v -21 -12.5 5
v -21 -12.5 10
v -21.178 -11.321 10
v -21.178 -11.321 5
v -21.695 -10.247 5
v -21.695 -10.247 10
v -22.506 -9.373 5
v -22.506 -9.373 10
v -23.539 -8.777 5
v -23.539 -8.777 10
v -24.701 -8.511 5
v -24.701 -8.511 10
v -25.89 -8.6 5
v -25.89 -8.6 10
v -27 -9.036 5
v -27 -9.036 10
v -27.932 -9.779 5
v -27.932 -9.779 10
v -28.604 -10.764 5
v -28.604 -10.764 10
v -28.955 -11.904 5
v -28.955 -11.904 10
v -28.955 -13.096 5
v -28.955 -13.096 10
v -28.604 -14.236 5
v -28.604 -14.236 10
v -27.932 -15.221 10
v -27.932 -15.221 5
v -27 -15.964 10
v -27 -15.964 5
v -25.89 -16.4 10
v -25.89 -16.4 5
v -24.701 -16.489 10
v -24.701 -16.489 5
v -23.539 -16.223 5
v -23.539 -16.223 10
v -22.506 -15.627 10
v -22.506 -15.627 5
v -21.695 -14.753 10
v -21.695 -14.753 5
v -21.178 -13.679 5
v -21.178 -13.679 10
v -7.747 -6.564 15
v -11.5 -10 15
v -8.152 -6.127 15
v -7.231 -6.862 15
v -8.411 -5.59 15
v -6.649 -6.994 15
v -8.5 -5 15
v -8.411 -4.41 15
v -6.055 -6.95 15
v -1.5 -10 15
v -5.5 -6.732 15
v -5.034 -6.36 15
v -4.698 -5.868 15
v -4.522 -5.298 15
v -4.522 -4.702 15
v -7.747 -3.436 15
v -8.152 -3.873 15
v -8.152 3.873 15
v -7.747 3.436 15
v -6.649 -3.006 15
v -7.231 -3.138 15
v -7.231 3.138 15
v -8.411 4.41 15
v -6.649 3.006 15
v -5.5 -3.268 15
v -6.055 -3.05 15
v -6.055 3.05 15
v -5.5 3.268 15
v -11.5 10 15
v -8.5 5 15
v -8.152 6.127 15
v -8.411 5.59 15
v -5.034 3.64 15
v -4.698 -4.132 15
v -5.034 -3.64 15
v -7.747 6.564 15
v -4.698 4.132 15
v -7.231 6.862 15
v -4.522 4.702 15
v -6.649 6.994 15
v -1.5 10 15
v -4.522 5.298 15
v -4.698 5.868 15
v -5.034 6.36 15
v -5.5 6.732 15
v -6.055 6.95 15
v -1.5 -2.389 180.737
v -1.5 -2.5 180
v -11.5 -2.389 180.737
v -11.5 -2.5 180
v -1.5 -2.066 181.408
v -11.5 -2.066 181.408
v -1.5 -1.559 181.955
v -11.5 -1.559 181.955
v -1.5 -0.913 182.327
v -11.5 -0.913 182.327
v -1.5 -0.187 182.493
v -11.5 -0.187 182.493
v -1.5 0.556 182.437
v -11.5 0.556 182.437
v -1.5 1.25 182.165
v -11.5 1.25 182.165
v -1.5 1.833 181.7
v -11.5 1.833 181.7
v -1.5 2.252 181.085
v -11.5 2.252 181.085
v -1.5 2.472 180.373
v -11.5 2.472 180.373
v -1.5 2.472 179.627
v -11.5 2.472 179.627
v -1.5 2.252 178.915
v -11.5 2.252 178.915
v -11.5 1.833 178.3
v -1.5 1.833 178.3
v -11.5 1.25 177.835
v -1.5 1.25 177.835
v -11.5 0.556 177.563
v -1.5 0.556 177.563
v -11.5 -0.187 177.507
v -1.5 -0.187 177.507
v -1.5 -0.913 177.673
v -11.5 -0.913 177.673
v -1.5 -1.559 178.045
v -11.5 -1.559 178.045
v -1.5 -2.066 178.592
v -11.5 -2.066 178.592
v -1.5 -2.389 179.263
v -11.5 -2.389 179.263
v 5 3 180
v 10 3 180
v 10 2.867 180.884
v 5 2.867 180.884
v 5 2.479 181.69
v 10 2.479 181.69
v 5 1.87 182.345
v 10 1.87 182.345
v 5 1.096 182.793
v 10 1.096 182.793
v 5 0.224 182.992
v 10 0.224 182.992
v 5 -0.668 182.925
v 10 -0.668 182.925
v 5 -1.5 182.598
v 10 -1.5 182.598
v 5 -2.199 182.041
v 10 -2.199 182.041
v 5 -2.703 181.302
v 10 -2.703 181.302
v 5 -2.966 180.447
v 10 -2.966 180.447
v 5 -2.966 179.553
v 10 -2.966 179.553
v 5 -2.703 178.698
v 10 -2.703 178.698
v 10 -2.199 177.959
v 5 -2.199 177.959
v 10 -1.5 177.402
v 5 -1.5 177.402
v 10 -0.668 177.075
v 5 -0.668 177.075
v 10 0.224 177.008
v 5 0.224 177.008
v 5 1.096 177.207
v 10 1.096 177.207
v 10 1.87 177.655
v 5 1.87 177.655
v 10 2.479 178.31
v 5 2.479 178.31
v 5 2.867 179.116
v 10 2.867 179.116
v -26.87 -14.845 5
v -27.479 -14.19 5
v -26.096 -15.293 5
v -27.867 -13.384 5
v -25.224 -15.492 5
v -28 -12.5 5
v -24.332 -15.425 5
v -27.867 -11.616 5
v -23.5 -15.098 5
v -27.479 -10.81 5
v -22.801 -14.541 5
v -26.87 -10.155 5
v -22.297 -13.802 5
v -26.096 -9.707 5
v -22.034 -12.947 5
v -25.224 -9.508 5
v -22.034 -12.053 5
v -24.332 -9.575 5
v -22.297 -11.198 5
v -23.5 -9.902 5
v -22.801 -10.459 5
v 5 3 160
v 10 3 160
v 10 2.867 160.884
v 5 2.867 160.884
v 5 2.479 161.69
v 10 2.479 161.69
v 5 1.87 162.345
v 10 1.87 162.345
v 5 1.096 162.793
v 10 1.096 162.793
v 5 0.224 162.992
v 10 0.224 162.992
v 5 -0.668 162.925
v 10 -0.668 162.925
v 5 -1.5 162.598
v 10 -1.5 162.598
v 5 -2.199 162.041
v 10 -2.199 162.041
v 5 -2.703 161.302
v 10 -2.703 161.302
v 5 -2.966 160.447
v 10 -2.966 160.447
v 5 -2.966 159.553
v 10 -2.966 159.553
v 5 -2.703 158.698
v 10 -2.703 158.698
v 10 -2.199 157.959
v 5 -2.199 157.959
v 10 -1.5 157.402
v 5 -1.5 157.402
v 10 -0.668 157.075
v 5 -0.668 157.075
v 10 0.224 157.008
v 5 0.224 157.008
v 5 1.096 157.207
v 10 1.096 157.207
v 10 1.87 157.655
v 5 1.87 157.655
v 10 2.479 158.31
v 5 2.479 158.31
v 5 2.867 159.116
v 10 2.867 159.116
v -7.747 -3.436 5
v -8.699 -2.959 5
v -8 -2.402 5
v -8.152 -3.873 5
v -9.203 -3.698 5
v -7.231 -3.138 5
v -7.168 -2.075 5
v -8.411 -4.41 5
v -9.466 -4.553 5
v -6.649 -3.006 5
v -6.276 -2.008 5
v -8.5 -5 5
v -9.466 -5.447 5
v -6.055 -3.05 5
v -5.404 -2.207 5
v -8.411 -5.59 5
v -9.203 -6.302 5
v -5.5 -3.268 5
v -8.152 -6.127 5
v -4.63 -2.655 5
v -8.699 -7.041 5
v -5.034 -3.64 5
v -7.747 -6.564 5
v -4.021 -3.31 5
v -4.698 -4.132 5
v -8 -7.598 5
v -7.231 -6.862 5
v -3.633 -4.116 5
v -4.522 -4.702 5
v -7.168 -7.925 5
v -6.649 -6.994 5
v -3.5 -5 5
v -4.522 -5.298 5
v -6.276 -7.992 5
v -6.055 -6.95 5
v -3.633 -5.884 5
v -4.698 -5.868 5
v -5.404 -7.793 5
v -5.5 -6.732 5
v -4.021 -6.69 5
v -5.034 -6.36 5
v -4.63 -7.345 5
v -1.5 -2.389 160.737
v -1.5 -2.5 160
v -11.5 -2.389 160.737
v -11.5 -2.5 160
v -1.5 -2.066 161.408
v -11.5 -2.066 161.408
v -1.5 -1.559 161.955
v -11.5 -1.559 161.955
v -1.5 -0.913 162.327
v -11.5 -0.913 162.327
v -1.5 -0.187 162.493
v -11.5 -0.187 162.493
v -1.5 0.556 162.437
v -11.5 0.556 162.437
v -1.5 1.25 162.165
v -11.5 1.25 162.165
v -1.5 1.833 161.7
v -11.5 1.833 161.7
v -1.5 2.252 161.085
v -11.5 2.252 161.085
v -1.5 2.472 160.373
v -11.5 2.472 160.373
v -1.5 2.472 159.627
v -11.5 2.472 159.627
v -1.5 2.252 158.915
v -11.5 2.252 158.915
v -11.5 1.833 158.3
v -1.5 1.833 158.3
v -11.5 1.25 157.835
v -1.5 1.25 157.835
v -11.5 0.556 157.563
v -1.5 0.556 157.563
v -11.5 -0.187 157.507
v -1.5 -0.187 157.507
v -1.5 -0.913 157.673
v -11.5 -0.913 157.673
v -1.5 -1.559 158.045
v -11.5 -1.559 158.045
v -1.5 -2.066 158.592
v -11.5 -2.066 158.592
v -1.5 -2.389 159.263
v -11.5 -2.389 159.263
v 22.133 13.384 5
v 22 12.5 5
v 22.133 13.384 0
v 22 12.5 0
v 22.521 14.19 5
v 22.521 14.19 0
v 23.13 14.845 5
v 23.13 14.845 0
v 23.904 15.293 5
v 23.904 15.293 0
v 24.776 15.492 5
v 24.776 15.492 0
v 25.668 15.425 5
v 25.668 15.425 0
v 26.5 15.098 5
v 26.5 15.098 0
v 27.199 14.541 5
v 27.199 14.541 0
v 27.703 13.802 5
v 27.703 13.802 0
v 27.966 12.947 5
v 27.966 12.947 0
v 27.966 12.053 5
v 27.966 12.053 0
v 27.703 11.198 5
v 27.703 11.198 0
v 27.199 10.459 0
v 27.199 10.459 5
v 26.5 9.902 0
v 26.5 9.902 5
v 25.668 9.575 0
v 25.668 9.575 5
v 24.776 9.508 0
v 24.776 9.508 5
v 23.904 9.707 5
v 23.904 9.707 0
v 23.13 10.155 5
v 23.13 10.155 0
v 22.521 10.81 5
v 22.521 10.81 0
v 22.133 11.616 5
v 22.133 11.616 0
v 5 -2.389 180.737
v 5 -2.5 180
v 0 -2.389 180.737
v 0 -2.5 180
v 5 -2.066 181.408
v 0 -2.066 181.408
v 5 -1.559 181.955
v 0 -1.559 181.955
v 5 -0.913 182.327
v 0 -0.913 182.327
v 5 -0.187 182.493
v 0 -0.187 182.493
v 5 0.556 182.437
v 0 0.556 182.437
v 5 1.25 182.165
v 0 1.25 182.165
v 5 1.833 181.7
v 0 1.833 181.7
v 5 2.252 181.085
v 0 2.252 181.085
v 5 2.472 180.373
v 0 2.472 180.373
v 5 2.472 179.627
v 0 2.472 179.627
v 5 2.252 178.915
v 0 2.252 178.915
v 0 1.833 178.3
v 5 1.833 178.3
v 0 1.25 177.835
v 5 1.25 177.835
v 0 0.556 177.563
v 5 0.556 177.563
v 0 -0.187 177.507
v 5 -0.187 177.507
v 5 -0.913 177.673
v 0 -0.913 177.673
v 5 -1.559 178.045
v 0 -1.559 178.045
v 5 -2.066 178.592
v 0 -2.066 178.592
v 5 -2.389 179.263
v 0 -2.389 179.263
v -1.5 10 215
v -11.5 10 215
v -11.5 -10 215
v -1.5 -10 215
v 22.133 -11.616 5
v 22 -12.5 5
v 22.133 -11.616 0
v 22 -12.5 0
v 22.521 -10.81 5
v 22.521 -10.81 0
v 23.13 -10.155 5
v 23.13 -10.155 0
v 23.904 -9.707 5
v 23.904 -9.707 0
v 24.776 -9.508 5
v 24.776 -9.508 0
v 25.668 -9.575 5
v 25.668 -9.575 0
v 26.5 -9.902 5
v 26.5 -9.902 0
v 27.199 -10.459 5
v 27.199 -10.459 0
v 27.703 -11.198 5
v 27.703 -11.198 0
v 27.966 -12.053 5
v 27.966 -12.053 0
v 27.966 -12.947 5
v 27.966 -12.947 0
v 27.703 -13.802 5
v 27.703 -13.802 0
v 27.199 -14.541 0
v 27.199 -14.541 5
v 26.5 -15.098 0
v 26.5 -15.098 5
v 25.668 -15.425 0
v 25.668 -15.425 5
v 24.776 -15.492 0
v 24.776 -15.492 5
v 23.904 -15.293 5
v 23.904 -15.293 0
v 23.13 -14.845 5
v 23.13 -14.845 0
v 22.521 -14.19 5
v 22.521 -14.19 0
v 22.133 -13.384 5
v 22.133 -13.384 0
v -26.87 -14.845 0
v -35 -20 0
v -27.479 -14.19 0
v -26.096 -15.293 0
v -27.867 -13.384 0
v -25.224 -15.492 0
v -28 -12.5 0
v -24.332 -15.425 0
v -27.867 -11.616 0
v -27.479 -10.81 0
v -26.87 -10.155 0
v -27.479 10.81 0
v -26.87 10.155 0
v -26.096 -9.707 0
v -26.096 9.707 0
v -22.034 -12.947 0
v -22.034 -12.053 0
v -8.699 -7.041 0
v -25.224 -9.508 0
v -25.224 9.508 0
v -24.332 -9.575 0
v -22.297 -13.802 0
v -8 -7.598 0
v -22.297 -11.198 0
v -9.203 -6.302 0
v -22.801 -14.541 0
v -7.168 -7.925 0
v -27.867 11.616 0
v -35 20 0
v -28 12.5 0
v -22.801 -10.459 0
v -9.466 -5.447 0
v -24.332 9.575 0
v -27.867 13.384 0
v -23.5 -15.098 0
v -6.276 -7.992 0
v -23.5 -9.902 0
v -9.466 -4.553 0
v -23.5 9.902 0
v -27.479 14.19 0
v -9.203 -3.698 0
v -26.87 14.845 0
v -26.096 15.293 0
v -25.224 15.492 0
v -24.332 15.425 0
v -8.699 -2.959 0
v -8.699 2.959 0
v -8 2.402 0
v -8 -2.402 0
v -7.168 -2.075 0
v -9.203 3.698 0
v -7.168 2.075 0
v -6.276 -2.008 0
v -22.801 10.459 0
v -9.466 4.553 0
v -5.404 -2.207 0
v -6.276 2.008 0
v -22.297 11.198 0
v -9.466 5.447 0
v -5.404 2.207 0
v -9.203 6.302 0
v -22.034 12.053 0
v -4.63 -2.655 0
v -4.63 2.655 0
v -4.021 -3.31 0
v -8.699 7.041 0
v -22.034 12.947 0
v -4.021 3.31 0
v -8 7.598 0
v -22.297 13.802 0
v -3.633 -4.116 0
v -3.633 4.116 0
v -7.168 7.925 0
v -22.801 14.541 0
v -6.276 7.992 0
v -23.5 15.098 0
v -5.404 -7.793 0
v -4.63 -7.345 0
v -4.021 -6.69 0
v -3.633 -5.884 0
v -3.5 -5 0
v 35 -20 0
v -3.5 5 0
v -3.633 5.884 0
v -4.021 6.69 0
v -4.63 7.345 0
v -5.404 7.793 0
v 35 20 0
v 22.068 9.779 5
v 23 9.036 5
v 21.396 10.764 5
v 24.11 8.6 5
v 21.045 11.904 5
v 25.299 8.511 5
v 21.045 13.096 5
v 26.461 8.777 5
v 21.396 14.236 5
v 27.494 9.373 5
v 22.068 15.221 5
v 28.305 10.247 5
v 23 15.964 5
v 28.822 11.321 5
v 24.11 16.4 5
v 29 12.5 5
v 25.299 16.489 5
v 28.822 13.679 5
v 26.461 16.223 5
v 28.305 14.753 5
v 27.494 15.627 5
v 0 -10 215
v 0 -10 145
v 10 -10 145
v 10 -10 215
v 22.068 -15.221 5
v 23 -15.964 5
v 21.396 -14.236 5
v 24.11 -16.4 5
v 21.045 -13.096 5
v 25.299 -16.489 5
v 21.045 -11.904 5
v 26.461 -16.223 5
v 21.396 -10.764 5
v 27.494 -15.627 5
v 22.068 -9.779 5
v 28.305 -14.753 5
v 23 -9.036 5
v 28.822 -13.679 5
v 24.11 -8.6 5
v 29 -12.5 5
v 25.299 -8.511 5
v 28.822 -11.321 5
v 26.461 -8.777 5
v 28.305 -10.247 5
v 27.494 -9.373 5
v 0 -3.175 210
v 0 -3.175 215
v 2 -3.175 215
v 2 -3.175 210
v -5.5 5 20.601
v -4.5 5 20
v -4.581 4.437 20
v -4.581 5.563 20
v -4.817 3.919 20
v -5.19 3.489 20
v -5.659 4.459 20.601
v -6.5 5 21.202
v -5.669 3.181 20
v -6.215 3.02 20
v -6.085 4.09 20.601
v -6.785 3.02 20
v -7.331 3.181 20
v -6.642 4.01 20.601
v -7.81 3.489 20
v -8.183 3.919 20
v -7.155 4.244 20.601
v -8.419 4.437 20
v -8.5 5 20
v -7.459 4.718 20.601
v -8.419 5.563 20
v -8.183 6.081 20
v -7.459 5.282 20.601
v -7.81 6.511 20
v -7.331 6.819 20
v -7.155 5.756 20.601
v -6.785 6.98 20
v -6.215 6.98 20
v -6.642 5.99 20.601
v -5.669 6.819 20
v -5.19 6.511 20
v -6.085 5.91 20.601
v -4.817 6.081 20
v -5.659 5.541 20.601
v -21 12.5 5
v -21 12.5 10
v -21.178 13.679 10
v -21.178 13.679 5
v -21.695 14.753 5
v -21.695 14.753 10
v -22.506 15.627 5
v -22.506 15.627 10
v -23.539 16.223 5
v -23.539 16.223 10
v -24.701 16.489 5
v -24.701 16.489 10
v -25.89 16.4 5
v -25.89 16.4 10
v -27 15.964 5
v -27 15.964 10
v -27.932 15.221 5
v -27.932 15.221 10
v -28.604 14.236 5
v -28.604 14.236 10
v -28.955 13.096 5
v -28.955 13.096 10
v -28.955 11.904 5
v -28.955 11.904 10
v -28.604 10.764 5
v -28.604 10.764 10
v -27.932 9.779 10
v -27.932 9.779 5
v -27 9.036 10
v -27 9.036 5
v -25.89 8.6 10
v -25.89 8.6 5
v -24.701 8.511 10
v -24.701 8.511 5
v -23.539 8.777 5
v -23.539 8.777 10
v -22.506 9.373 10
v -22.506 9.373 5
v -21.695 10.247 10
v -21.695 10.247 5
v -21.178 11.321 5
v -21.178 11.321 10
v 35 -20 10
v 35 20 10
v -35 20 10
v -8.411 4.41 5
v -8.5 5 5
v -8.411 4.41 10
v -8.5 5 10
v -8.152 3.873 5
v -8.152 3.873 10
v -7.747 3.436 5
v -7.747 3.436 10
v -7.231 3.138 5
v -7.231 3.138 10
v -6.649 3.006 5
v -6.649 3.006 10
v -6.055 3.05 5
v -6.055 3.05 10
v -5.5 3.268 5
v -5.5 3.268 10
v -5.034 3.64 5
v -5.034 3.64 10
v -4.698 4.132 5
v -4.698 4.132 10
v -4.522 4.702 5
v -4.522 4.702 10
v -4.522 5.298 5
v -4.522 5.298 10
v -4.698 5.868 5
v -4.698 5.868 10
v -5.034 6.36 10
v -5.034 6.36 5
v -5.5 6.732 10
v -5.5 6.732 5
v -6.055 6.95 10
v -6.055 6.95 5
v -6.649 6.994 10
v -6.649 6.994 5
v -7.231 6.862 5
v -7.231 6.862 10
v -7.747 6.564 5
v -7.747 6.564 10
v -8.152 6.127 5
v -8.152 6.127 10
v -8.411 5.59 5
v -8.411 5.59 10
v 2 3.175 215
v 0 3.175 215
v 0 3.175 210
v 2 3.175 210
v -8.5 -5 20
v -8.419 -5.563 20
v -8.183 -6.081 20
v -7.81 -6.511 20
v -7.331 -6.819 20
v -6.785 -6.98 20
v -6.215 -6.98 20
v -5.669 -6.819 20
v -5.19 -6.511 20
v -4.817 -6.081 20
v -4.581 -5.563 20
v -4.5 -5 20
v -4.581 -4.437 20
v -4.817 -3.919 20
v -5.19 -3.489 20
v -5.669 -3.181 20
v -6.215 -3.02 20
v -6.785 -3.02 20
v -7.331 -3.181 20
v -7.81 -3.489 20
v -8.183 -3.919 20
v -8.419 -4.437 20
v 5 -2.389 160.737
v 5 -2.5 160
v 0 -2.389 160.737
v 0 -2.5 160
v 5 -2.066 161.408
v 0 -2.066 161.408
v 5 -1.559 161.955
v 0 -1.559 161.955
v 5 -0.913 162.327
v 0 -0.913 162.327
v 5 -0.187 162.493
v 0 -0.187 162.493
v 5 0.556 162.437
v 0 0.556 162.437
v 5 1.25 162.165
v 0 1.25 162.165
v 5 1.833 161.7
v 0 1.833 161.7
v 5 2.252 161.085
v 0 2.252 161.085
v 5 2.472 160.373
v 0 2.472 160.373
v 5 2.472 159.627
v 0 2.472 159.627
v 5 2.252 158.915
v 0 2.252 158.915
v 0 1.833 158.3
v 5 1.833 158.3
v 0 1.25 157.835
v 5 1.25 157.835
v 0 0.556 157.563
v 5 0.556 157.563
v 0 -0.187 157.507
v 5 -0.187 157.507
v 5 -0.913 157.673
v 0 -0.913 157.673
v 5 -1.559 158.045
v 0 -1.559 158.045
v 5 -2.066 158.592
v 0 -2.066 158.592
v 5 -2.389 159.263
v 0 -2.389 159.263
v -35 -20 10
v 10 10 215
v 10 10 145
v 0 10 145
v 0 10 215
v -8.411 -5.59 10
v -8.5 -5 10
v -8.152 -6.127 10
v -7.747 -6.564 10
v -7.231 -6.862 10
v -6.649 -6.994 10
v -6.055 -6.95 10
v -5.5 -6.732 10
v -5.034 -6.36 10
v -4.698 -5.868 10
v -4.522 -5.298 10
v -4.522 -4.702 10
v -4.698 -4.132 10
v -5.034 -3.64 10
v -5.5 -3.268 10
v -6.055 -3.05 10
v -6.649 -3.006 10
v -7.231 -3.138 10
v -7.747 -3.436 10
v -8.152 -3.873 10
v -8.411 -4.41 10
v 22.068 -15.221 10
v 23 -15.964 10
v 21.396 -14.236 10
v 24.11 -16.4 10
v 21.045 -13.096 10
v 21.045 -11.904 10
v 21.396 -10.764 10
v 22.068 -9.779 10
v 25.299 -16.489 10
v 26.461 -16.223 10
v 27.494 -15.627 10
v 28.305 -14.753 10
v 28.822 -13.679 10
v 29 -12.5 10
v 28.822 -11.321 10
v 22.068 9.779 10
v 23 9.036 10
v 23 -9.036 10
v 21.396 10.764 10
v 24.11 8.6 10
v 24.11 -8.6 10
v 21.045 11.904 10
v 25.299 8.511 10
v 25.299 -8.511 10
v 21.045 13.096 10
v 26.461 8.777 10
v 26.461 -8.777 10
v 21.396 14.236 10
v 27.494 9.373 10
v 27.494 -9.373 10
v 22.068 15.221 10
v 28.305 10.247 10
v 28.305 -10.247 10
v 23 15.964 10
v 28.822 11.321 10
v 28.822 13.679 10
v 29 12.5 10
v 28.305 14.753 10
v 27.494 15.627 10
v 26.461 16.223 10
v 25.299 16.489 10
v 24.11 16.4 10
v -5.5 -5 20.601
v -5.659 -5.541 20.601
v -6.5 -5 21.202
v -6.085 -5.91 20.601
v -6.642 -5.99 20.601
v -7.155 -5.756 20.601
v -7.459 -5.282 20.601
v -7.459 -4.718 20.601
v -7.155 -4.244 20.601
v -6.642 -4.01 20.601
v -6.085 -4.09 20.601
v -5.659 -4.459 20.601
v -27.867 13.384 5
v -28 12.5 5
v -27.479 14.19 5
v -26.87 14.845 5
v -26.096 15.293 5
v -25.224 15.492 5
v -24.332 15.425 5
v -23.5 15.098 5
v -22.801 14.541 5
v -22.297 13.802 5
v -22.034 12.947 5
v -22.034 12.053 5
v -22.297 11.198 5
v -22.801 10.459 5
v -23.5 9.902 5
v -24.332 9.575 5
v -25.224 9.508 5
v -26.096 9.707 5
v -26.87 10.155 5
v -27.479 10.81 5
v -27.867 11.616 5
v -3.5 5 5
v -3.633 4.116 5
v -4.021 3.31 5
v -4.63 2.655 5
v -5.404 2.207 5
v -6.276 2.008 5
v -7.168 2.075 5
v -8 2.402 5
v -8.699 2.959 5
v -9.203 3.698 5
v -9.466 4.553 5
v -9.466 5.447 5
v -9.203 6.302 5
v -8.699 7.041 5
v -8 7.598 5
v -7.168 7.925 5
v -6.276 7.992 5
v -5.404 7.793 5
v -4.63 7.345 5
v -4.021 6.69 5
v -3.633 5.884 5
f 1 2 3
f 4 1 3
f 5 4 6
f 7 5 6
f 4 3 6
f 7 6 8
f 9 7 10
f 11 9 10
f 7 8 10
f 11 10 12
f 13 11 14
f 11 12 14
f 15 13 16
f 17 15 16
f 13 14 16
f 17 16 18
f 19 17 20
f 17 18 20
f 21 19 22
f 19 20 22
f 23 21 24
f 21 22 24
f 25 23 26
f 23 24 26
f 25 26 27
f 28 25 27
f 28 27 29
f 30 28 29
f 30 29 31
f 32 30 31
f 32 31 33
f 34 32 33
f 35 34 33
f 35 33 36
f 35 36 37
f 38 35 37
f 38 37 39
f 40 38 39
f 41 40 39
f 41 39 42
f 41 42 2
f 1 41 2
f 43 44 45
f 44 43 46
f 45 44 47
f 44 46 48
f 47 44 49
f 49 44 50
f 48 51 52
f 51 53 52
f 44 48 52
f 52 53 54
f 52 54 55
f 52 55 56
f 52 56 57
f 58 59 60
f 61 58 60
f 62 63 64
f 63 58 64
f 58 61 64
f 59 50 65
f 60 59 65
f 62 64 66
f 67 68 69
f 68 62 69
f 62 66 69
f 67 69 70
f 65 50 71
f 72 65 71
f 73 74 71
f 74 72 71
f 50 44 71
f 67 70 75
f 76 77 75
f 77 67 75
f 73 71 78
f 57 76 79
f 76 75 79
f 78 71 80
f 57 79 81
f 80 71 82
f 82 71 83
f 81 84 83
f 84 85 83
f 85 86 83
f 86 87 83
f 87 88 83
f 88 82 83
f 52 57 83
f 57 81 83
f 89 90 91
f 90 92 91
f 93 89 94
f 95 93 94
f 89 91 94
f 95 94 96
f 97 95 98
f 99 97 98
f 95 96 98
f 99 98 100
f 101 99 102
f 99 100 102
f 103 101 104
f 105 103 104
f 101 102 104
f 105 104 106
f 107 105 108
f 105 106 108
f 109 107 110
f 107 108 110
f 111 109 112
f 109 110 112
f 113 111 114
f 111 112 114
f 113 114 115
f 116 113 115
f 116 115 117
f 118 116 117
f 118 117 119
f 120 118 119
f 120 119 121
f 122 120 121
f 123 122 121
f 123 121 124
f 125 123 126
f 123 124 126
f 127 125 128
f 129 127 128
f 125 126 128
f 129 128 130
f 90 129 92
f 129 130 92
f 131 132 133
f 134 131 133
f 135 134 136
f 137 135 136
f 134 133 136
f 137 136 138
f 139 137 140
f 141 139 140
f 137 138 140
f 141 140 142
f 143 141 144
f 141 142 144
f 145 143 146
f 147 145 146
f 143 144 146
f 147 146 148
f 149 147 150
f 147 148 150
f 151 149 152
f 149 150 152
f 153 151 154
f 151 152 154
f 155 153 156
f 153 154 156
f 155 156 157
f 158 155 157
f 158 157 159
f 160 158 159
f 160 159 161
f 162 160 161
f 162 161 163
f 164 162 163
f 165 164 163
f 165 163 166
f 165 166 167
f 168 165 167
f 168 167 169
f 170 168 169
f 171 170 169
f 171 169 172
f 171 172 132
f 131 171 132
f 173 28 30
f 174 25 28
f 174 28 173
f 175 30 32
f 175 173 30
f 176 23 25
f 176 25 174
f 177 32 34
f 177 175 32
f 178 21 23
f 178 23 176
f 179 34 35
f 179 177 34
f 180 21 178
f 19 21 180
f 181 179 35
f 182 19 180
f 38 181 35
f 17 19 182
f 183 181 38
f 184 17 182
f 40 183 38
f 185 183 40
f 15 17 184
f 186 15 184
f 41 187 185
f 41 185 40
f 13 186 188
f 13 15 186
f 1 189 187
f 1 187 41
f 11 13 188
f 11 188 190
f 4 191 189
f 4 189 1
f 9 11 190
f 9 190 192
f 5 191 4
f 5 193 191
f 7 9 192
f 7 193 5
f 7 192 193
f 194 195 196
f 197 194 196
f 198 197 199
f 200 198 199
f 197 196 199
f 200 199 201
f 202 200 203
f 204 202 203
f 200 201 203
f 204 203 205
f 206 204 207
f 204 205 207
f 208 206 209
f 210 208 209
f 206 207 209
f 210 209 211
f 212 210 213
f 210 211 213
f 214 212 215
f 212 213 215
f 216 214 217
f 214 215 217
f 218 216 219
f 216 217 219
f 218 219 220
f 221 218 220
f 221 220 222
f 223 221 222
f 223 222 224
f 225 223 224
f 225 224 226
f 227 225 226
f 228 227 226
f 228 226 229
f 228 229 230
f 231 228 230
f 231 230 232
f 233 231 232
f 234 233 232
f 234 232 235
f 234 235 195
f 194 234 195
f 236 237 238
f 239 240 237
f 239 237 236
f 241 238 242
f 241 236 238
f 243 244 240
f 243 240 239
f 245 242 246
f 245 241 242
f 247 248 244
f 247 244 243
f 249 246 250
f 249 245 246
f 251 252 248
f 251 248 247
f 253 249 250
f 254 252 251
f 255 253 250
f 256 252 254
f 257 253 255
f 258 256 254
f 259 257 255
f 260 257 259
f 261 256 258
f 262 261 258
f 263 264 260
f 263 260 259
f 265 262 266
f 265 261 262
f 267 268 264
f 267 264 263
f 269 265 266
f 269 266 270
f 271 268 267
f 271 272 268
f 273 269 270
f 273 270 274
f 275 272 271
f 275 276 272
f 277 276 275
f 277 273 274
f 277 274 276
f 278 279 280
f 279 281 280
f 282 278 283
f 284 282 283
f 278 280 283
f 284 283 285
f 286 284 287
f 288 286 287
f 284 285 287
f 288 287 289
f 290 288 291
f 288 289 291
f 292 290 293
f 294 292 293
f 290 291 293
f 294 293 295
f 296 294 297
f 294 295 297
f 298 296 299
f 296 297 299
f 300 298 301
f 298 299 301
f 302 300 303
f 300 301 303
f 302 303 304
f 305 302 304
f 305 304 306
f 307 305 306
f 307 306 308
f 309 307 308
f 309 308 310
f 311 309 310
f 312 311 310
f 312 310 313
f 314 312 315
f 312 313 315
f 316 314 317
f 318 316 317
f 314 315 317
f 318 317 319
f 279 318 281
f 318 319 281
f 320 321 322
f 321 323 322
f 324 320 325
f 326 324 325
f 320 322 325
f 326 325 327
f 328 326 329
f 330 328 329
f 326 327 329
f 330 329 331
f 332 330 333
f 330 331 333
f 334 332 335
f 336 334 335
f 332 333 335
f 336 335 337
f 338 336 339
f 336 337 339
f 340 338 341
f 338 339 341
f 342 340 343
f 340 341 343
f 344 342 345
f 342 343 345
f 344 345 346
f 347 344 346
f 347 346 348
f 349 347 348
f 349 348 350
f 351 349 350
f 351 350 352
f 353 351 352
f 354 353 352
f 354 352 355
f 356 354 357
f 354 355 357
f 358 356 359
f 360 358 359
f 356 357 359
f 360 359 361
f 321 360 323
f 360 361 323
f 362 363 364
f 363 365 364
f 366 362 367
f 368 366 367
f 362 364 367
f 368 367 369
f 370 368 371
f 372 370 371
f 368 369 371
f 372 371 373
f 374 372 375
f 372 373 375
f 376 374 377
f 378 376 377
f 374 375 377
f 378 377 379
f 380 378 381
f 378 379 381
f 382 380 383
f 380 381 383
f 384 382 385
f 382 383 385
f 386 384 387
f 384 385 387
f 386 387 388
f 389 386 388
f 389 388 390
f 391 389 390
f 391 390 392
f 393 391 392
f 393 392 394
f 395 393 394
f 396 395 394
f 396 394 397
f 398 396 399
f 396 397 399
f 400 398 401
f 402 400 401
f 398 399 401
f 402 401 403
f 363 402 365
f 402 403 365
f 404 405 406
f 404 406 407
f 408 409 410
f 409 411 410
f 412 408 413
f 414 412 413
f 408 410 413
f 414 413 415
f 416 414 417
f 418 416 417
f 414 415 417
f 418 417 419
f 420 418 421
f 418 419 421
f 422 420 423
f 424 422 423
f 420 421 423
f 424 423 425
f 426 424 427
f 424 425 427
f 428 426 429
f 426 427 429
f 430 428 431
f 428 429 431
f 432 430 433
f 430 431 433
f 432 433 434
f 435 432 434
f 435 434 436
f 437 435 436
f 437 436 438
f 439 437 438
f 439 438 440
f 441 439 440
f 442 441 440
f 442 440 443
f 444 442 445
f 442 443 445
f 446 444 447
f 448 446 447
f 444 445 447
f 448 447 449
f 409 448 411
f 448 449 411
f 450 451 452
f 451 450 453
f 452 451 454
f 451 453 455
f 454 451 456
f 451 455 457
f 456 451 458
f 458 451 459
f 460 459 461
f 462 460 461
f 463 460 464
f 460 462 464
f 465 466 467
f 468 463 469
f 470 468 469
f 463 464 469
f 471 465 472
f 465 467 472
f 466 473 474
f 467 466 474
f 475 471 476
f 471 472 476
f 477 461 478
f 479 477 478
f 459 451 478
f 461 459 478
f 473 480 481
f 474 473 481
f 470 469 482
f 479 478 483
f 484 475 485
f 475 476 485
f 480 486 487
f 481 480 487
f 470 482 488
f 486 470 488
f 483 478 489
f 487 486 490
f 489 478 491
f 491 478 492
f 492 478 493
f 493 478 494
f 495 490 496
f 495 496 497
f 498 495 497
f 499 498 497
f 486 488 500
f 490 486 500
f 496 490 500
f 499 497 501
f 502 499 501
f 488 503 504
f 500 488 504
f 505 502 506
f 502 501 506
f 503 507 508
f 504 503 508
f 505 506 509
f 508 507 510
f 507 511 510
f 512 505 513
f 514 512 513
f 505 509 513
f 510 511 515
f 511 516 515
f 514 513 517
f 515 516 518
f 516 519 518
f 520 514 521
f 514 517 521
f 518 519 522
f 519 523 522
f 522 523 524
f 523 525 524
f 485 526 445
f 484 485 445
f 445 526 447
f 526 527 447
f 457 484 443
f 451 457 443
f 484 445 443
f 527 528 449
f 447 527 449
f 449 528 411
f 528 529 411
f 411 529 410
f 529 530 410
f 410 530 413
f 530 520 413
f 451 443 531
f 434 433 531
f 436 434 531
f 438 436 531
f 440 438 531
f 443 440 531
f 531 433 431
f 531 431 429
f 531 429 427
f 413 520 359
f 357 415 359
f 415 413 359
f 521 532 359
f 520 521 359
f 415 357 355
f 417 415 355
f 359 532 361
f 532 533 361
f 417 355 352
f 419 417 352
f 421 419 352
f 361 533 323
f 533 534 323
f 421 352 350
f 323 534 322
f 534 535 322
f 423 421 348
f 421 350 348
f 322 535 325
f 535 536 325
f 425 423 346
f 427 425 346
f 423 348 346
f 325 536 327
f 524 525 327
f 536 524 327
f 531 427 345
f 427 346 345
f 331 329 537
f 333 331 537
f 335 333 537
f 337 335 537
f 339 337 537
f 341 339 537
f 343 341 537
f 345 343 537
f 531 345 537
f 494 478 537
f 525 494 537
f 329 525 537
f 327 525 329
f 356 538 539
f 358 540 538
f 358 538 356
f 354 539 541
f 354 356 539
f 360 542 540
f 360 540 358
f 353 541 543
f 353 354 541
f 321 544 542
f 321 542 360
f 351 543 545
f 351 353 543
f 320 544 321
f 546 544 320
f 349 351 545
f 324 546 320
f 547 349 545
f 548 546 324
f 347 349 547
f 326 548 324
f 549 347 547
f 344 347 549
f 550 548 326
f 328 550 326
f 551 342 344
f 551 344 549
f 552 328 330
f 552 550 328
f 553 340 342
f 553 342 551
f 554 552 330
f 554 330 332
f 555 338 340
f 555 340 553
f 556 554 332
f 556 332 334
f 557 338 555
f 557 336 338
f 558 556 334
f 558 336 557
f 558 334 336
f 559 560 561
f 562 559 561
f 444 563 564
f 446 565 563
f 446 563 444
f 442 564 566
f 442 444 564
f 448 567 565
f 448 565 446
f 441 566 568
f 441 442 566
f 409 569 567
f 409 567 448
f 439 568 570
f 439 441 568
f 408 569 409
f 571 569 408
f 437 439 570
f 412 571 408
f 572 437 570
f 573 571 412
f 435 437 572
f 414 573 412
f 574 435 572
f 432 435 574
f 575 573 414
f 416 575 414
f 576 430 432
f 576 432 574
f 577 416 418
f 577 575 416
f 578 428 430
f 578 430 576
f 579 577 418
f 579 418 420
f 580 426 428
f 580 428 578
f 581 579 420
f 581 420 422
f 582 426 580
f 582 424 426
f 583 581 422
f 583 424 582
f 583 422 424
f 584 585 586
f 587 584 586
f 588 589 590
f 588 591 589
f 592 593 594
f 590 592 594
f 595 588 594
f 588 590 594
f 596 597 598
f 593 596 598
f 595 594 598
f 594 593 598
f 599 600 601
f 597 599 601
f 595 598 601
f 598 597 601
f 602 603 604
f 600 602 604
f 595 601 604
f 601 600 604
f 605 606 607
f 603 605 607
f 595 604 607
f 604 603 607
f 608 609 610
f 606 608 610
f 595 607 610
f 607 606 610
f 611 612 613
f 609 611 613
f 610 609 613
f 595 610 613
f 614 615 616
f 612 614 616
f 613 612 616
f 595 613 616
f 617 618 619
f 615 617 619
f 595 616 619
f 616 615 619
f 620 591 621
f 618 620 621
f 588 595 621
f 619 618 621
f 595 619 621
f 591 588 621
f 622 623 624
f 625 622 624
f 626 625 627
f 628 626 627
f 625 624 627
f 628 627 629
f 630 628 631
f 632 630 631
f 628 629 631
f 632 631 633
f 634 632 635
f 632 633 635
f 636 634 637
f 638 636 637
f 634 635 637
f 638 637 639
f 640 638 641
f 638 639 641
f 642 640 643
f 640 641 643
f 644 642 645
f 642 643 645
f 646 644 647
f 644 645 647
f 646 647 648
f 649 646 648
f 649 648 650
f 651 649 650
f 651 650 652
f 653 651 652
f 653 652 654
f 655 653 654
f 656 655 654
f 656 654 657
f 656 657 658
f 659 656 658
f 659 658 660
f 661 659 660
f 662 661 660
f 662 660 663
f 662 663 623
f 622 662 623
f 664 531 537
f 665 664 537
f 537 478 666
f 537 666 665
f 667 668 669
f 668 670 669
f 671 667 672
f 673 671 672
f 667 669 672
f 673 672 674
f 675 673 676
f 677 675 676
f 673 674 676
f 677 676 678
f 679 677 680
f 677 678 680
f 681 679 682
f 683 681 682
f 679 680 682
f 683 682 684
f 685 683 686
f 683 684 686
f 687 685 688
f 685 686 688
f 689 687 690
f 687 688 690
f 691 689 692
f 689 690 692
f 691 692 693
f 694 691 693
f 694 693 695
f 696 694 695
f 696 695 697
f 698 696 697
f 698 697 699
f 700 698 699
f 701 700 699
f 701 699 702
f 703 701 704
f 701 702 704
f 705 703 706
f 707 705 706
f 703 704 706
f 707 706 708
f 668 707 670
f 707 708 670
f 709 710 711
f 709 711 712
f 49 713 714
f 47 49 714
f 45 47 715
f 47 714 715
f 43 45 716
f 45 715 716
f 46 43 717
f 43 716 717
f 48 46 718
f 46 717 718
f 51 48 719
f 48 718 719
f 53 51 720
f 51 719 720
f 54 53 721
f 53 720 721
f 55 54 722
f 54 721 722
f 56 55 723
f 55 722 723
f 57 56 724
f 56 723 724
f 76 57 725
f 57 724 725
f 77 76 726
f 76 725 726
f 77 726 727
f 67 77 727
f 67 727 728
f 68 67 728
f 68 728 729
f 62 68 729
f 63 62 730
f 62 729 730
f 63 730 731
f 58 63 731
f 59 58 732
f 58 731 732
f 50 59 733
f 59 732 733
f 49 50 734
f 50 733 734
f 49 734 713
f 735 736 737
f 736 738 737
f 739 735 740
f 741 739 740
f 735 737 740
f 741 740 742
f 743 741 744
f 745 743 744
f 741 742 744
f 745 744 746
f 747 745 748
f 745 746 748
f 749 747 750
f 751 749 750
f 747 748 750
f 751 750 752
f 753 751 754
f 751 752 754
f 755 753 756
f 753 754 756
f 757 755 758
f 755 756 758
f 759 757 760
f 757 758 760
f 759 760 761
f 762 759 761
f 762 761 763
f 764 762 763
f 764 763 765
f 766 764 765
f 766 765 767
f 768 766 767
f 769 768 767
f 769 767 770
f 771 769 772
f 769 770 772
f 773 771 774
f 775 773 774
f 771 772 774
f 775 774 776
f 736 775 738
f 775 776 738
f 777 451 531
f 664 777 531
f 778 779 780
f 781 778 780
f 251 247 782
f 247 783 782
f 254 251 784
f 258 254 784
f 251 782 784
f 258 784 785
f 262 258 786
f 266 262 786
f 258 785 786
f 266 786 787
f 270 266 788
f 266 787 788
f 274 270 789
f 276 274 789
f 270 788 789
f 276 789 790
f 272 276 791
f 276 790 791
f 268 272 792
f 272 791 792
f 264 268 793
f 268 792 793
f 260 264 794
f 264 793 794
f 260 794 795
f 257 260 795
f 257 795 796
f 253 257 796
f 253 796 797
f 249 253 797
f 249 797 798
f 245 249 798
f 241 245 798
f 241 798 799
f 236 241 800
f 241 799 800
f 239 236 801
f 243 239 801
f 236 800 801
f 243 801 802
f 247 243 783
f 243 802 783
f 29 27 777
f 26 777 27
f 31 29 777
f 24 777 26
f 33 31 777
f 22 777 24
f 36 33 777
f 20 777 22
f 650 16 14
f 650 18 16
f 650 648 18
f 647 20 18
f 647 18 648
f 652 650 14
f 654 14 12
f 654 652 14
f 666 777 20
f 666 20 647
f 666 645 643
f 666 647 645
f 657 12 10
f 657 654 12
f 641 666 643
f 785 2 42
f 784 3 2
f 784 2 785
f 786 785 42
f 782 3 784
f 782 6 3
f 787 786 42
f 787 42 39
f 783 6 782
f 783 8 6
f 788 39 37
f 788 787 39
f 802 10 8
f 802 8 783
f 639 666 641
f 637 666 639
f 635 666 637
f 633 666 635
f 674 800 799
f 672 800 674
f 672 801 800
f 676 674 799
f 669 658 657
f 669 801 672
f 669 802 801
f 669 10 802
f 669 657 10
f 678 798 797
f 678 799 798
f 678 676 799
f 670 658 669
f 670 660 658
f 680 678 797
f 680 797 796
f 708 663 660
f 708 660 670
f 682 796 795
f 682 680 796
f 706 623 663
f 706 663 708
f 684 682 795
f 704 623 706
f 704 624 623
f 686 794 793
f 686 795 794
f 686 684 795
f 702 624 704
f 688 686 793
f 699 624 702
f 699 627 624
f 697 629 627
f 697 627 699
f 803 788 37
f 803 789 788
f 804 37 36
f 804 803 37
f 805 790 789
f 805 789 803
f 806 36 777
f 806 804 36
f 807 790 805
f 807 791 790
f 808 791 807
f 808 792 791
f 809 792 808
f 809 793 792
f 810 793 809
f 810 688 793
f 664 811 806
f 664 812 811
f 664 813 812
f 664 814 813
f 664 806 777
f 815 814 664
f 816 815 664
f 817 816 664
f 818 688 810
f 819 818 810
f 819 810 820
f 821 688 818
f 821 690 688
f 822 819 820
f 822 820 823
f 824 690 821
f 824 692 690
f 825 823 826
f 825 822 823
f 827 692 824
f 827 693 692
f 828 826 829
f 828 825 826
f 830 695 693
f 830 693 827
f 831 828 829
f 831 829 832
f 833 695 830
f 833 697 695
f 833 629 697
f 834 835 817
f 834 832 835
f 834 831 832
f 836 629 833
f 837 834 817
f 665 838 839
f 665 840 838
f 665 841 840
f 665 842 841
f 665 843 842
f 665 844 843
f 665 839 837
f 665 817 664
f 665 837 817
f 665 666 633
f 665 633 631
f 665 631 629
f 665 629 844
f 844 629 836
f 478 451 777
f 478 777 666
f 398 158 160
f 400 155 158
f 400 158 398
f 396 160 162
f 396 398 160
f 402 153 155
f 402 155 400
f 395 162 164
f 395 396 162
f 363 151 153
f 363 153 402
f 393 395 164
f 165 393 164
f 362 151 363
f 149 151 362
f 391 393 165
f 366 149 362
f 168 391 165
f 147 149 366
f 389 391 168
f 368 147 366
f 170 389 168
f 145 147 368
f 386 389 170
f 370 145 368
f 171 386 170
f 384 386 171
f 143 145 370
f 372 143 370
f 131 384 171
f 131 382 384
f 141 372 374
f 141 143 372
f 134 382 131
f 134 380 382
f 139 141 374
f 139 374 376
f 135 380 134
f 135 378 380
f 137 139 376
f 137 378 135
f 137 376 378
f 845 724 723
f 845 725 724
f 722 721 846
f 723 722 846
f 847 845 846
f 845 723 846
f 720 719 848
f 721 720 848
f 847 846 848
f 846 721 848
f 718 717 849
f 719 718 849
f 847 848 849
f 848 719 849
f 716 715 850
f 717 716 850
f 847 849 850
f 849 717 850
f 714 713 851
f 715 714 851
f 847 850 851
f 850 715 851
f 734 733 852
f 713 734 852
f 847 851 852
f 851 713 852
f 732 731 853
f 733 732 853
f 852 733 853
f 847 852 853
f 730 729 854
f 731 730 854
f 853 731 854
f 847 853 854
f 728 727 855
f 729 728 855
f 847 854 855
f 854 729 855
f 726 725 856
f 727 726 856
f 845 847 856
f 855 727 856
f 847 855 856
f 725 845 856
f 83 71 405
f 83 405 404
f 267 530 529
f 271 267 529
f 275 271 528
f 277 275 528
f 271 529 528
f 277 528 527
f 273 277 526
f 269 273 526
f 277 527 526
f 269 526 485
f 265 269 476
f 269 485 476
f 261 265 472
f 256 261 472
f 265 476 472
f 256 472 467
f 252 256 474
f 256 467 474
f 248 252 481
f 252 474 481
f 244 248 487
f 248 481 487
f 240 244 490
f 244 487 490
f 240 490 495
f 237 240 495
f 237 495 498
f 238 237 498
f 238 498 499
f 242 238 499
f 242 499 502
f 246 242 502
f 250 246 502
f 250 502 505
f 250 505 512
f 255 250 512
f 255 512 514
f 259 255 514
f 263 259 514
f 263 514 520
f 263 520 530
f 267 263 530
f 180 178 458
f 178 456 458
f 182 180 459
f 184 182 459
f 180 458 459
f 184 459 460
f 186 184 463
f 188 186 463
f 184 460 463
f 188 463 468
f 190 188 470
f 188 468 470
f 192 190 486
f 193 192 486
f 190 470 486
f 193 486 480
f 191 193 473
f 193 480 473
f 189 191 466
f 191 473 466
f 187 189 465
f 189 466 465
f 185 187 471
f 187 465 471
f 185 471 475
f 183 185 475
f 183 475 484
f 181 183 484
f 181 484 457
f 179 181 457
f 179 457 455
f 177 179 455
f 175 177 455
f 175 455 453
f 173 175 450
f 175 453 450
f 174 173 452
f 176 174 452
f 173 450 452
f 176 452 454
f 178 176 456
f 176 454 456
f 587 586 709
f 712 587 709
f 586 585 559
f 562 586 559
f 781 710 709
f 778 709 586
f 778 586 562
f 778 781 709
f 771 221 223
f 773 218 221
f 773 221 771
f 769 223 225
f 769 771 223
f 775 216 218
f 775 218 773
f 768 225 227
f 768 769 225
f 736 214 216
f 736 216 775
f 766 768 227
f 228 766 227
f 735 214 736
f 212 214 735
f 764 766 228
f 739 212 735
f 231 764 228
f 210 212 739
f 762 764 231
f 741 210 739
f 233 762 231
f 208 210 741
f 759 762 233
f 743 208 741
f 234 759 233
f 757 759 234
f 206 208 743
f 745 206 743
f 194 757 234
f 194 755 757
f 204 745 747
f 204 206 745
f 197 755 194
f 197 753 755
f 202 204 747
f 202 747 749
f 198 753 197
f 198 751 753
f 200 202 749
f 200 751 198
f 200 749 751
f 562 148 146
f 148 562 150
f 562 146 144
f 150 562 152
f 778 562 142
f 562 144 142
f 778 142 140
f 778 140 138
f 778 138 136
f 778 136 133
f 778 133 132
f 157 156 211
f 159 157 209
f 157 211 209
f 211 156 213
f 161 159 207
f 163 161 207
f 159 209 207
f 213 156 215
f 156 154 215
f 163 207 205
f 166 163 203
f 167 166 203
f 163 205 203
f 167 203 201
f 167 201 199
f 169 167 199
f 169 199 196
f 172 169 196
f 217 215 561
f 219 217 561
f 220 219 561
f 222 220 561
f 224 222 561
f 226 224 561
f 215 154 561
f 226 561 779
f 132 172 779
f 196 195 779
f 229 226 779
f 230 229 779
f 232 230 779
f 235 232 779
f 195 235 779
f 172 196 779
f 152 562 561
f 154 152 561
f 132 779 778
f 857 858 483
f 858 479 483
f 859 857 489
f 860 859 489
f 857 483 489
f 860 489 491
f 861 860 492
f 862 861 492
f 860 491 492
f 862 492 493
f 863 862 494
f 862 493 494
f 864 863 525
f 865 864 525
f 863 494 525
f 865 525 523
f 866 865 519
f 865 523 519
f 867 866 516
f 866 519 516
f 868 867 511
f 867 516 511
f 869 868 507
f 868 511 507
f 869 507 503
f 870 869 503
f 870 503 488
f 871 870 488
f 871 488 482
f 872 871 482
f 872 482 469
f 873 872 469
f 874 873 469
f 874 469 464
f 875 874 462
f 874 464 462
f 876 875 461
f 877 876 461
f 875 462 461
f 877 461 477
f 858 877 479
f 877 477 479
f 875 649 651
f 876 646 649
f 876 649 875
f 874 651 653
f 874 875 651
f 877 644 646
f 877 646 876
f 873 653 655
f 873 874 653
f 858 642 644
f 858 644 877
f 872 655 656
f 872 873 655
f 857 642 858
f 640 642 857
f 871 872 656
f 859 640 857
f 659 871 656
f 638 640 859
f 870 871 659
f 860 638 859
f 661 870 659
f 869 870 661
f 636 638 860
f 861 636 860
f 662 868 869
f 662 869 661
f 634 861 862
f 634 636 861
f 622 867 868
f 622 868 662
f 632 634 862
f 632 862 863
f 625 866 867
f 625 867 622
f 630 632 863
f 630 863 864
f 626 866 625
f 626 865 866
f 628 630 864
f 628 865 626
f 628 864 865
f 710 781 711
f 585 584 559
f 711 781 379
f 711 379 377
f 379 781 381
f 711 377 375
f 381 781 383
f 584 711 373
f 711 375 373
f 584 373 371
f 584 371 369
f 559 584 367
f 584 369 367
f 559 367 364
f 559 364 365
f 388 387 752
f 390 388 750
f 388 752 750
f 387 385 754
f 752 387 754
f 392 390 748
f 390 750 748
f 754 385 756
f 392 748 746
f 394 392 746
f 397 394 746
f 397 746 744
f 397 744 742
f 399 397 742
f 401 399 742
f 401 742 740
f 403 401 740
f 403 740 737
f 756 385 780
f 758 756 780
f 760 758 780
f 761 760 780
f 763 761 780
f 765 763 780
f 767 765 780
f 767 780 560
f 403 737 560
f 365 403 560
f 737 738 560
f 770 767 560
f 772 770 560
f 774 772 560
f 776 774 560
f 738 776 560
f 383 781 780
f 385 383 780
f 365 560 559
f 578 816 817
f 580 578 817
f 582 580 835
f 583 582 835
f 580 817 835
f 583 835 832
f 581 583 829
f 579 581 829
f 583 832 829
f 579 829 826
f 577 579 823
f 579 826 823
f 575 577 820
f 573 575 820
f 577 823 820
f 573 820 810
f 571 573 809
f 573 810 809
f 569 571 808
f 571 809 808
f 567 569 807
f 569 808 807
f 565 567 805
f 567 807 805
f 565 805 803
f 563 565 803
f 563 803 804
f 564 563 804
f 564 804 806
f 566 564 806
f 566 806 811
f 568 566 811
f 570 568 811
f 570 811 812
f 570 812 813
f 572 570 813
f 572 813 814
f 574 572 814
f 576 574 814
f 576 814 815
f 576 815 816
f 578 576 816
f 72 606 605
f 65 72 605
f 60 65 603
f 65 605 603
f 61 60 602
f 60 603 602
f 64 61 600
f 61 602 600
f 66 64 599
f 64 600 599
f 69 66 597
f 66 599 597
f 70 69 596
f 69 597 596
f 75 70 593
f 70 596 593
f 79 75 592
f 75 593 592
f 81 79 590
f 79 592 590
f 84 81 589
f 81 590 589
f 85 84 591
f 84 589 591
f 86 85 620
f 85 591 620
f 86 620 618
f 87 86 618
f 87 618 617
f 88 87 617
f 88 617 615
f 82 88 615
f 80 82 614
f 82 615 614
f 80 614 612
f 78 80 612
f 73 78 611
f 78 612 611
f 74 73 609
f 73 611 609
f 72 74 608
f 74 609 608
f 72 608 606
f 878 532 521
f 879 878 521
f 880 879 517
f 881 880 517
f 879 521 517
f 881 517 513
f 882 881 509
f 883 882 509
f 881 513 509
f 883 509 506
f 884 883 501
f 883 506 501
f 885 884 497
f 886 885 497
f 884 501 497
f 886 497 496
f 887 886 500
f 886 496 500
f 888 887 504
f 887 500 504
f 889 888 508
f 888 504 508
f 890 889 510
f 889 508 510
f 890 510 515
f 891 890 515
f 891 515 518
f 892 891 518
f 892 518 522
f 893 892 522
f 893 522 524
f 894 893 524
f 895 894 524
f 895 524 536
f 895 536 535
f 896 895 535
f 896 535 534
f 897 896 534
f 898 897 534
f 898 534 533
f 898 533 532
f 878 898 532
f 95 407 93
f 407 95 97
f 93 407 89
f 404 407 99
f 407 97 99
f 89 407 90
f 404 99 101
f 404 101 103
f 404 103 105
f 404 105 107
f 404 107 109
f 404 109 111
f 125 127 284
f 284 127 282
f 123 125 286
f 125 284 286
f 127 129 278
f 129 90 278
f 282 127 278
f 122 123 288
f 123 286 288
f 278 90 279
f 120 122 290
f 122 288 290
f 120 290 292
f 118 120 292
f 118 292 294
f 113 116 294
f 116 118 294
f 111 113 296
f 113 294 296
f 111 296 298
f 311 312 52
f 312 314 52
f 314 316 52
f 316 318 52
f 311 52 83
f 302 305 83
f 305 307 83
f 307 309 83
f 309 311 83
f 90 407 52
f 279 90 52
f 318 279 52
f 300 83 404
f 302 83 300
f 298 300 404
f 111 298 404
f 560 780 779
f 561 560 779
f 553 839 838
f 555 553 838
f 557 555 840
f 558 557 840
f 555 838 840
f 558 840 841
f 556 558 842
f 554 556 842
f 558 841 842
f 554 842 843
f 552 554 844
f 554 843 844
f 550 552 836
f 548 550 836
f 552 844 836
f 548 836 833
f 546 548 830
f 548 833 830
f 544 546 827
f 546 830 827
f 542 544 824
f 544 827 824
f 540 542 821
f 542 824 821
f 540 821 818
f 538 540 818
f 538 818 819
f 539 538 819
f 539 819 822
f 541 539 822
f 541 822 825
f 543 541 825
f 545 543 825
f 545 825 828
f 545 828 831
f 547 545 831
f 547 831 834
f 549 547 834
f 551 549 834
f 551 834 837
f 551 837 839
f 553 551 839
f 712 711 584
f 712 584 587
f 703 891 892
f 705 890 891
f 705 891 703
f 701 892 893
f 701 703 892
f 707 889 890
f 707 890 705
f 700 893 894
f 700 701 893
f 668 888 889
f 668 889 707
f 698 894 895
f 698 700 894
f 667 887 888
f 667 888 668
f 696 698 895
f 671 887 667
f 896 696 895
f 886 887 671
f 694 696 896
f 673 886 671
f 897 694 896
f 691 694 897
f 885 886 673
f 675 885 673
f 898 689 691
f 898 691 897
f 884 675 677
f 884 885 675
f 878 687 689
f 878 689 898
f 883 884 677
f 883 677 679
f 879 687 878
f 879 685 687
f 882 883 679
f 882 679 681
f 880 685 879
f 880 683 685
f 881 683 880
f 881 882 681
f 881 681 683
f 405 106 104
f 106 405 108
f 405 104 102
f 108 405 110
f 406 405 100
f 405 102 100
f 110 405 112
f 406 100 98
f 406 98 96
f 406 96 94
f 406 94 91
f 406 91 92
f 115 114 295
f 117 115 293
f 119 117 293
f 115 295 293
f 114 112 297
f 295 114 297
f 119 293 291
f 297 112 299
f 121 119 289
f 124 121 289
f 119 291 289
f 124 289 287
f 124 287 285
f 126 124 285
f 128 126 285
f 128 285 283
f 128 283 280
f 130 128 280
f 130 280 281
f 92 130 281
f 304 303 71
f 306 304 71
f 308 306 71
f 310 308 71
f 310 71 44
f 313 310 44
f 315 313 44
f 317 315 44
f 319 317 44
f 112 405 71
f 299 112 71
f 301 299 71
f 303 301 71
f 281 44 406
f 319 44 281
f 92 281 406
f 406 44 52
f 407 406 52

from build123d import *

# Parameters (mm, degrees)
F0_W              = 70
F0_H              = 40
F1_DEPTH          = 10
F4_D              = 6
F4_CBORE_D        = 8
F4_CBORE_DEPTH    = 5
F6_W              = 10
F6_H              = 10
F7_DEPTH          = 200
F10_DEPTH         = 70
F13_D             = 5
F13_CBORE_D       = 6
F13_CBORE_DEPTH   = 5
F13_2_D           = 5
F13_2_CBORE_D     = 6
F13_2_CBORE_DEPTH = 5
F15_D             = 4
F15_DEPTH         = 20
F15_CBORE_D       = 6
F15_CBORE_DEPTH   = 5
F15_TIP           = 1.2017212381
F15_2_D           = 4
F15_2_DEPTH       = 20
F15_2_CBORE_D     = 6
F15_2_CBORE_DEPTH = 5
F15_2_TIP         = 1.2017212381
F17_W             = 2
F17_H             = 3.175
F18_DEPTH         = 5


with BuildPart() as f1:
    # F0 (on Top) → F1 (new body)
    with BuildSketch(Plane.XY):
        Rectangle(F0_W, F0_H)
    extrude(amount=F1_DEPTH)

    # F4 (through all)
    with Locations(Plane.XY.offset(10)):
        with Locations((-25, 12.5), (25, 12.5), (25, -12.5), (-25, -12.5)):
            CounterBoreHole(F4_D / 2, F4_CBORE_D / 2, F4_CBORE_DEPTH)

    # F15
    with Locations(Plane(origin=(0, 0, 0), x_dir=(1, 0, 0), z_dir=(0, 0, -1))):
        with Locations((-6.5, -5), (-6.5, 5)):
            CounterBoreHole(F15_D / 2, F15_CBORE_D / 2, F15_CBORE_DEPTH, depth=F15_DEPTH)
            with Locations((0, 0, -(F15_DEPTH + F15_TIP / 2))):  # 118° drill point
                Cone(0, F15_D / 2, F15_TIP, mode=Mode.SUBTRACT)


with BuildPart() as f7:
    # F6 (on offset) → F7 (new body)
    with BuildSketch(Plane.XY.offset(15)):
        with Locations((-6.5, 5)):
            Rectangle(F6_W, F6_H)
        with Locations((-6.5, -5)):
            Rectangle(F6_W, F6_H)
    extrude(amount=F7_DEPTH)

    # F13 (through all)
    with Locations(Plane.YZ.offset(10)):
        with Locations((0, 160), (0, 180)):
            CounterBoreHole(F13_D / 2, F13_CBORE_D / 2, F13_CBORE_DEPTH)

    # F15#2
    with Locations(Plane(origin=(0, 0, 0), x_dir=(1, 0, 0), z_dir=(0, 0, -1))):
        with Locations((-6.5, -5), (-6.5, 5)):
            CounterBoreHole(F15_2_D / 2, F15_2_CBORE_D / 2, F15_2_CBORE_DEPTH, depth=F15_2_DEPTH)
            with Locations((0, 0, -(F15_2_DEPTH + F15_2_TIP / 2))):  # 118° drill point
                Cone(0, F15_2_D / 2, F15_2_TIP, mode=Mode.SUBTRACT)


with BuildPart() as f10:
    # F9 (on offset) → F10 (new body)
    with BuildSketch(Plane.XY.offset(145)):
        Polygon((0, 10), (0, 0), (0, -10), (10, -10), (10, 10), align=None)
    extrude(amount=F10_DEPTH)

    # F13#2 (through all)
    with Locations(Plane.YZ.offset(10)):
        with Locations((0, 160), (0, 180)):
            CounterBoreHole(F13_2_D / 2, F13_2_CBORE_D / 2, F13_2_CBORE_DEPTH)

    # F17 (on offset) → F18 (cut)
    with BuildSketch(Plane.XY.offset(215)):
        with Locations((1, 1.5875)):
            Rectangle(F17_W, F17_H)
        with Locations((1, -1.5875)):
            Rectangle(F17_W, F17_H)
    extrude(amount=-F18_DEPTH, mode=Mode.SUBTRACT)


solid = Compound([f1.part, f7.part, f10.part])
